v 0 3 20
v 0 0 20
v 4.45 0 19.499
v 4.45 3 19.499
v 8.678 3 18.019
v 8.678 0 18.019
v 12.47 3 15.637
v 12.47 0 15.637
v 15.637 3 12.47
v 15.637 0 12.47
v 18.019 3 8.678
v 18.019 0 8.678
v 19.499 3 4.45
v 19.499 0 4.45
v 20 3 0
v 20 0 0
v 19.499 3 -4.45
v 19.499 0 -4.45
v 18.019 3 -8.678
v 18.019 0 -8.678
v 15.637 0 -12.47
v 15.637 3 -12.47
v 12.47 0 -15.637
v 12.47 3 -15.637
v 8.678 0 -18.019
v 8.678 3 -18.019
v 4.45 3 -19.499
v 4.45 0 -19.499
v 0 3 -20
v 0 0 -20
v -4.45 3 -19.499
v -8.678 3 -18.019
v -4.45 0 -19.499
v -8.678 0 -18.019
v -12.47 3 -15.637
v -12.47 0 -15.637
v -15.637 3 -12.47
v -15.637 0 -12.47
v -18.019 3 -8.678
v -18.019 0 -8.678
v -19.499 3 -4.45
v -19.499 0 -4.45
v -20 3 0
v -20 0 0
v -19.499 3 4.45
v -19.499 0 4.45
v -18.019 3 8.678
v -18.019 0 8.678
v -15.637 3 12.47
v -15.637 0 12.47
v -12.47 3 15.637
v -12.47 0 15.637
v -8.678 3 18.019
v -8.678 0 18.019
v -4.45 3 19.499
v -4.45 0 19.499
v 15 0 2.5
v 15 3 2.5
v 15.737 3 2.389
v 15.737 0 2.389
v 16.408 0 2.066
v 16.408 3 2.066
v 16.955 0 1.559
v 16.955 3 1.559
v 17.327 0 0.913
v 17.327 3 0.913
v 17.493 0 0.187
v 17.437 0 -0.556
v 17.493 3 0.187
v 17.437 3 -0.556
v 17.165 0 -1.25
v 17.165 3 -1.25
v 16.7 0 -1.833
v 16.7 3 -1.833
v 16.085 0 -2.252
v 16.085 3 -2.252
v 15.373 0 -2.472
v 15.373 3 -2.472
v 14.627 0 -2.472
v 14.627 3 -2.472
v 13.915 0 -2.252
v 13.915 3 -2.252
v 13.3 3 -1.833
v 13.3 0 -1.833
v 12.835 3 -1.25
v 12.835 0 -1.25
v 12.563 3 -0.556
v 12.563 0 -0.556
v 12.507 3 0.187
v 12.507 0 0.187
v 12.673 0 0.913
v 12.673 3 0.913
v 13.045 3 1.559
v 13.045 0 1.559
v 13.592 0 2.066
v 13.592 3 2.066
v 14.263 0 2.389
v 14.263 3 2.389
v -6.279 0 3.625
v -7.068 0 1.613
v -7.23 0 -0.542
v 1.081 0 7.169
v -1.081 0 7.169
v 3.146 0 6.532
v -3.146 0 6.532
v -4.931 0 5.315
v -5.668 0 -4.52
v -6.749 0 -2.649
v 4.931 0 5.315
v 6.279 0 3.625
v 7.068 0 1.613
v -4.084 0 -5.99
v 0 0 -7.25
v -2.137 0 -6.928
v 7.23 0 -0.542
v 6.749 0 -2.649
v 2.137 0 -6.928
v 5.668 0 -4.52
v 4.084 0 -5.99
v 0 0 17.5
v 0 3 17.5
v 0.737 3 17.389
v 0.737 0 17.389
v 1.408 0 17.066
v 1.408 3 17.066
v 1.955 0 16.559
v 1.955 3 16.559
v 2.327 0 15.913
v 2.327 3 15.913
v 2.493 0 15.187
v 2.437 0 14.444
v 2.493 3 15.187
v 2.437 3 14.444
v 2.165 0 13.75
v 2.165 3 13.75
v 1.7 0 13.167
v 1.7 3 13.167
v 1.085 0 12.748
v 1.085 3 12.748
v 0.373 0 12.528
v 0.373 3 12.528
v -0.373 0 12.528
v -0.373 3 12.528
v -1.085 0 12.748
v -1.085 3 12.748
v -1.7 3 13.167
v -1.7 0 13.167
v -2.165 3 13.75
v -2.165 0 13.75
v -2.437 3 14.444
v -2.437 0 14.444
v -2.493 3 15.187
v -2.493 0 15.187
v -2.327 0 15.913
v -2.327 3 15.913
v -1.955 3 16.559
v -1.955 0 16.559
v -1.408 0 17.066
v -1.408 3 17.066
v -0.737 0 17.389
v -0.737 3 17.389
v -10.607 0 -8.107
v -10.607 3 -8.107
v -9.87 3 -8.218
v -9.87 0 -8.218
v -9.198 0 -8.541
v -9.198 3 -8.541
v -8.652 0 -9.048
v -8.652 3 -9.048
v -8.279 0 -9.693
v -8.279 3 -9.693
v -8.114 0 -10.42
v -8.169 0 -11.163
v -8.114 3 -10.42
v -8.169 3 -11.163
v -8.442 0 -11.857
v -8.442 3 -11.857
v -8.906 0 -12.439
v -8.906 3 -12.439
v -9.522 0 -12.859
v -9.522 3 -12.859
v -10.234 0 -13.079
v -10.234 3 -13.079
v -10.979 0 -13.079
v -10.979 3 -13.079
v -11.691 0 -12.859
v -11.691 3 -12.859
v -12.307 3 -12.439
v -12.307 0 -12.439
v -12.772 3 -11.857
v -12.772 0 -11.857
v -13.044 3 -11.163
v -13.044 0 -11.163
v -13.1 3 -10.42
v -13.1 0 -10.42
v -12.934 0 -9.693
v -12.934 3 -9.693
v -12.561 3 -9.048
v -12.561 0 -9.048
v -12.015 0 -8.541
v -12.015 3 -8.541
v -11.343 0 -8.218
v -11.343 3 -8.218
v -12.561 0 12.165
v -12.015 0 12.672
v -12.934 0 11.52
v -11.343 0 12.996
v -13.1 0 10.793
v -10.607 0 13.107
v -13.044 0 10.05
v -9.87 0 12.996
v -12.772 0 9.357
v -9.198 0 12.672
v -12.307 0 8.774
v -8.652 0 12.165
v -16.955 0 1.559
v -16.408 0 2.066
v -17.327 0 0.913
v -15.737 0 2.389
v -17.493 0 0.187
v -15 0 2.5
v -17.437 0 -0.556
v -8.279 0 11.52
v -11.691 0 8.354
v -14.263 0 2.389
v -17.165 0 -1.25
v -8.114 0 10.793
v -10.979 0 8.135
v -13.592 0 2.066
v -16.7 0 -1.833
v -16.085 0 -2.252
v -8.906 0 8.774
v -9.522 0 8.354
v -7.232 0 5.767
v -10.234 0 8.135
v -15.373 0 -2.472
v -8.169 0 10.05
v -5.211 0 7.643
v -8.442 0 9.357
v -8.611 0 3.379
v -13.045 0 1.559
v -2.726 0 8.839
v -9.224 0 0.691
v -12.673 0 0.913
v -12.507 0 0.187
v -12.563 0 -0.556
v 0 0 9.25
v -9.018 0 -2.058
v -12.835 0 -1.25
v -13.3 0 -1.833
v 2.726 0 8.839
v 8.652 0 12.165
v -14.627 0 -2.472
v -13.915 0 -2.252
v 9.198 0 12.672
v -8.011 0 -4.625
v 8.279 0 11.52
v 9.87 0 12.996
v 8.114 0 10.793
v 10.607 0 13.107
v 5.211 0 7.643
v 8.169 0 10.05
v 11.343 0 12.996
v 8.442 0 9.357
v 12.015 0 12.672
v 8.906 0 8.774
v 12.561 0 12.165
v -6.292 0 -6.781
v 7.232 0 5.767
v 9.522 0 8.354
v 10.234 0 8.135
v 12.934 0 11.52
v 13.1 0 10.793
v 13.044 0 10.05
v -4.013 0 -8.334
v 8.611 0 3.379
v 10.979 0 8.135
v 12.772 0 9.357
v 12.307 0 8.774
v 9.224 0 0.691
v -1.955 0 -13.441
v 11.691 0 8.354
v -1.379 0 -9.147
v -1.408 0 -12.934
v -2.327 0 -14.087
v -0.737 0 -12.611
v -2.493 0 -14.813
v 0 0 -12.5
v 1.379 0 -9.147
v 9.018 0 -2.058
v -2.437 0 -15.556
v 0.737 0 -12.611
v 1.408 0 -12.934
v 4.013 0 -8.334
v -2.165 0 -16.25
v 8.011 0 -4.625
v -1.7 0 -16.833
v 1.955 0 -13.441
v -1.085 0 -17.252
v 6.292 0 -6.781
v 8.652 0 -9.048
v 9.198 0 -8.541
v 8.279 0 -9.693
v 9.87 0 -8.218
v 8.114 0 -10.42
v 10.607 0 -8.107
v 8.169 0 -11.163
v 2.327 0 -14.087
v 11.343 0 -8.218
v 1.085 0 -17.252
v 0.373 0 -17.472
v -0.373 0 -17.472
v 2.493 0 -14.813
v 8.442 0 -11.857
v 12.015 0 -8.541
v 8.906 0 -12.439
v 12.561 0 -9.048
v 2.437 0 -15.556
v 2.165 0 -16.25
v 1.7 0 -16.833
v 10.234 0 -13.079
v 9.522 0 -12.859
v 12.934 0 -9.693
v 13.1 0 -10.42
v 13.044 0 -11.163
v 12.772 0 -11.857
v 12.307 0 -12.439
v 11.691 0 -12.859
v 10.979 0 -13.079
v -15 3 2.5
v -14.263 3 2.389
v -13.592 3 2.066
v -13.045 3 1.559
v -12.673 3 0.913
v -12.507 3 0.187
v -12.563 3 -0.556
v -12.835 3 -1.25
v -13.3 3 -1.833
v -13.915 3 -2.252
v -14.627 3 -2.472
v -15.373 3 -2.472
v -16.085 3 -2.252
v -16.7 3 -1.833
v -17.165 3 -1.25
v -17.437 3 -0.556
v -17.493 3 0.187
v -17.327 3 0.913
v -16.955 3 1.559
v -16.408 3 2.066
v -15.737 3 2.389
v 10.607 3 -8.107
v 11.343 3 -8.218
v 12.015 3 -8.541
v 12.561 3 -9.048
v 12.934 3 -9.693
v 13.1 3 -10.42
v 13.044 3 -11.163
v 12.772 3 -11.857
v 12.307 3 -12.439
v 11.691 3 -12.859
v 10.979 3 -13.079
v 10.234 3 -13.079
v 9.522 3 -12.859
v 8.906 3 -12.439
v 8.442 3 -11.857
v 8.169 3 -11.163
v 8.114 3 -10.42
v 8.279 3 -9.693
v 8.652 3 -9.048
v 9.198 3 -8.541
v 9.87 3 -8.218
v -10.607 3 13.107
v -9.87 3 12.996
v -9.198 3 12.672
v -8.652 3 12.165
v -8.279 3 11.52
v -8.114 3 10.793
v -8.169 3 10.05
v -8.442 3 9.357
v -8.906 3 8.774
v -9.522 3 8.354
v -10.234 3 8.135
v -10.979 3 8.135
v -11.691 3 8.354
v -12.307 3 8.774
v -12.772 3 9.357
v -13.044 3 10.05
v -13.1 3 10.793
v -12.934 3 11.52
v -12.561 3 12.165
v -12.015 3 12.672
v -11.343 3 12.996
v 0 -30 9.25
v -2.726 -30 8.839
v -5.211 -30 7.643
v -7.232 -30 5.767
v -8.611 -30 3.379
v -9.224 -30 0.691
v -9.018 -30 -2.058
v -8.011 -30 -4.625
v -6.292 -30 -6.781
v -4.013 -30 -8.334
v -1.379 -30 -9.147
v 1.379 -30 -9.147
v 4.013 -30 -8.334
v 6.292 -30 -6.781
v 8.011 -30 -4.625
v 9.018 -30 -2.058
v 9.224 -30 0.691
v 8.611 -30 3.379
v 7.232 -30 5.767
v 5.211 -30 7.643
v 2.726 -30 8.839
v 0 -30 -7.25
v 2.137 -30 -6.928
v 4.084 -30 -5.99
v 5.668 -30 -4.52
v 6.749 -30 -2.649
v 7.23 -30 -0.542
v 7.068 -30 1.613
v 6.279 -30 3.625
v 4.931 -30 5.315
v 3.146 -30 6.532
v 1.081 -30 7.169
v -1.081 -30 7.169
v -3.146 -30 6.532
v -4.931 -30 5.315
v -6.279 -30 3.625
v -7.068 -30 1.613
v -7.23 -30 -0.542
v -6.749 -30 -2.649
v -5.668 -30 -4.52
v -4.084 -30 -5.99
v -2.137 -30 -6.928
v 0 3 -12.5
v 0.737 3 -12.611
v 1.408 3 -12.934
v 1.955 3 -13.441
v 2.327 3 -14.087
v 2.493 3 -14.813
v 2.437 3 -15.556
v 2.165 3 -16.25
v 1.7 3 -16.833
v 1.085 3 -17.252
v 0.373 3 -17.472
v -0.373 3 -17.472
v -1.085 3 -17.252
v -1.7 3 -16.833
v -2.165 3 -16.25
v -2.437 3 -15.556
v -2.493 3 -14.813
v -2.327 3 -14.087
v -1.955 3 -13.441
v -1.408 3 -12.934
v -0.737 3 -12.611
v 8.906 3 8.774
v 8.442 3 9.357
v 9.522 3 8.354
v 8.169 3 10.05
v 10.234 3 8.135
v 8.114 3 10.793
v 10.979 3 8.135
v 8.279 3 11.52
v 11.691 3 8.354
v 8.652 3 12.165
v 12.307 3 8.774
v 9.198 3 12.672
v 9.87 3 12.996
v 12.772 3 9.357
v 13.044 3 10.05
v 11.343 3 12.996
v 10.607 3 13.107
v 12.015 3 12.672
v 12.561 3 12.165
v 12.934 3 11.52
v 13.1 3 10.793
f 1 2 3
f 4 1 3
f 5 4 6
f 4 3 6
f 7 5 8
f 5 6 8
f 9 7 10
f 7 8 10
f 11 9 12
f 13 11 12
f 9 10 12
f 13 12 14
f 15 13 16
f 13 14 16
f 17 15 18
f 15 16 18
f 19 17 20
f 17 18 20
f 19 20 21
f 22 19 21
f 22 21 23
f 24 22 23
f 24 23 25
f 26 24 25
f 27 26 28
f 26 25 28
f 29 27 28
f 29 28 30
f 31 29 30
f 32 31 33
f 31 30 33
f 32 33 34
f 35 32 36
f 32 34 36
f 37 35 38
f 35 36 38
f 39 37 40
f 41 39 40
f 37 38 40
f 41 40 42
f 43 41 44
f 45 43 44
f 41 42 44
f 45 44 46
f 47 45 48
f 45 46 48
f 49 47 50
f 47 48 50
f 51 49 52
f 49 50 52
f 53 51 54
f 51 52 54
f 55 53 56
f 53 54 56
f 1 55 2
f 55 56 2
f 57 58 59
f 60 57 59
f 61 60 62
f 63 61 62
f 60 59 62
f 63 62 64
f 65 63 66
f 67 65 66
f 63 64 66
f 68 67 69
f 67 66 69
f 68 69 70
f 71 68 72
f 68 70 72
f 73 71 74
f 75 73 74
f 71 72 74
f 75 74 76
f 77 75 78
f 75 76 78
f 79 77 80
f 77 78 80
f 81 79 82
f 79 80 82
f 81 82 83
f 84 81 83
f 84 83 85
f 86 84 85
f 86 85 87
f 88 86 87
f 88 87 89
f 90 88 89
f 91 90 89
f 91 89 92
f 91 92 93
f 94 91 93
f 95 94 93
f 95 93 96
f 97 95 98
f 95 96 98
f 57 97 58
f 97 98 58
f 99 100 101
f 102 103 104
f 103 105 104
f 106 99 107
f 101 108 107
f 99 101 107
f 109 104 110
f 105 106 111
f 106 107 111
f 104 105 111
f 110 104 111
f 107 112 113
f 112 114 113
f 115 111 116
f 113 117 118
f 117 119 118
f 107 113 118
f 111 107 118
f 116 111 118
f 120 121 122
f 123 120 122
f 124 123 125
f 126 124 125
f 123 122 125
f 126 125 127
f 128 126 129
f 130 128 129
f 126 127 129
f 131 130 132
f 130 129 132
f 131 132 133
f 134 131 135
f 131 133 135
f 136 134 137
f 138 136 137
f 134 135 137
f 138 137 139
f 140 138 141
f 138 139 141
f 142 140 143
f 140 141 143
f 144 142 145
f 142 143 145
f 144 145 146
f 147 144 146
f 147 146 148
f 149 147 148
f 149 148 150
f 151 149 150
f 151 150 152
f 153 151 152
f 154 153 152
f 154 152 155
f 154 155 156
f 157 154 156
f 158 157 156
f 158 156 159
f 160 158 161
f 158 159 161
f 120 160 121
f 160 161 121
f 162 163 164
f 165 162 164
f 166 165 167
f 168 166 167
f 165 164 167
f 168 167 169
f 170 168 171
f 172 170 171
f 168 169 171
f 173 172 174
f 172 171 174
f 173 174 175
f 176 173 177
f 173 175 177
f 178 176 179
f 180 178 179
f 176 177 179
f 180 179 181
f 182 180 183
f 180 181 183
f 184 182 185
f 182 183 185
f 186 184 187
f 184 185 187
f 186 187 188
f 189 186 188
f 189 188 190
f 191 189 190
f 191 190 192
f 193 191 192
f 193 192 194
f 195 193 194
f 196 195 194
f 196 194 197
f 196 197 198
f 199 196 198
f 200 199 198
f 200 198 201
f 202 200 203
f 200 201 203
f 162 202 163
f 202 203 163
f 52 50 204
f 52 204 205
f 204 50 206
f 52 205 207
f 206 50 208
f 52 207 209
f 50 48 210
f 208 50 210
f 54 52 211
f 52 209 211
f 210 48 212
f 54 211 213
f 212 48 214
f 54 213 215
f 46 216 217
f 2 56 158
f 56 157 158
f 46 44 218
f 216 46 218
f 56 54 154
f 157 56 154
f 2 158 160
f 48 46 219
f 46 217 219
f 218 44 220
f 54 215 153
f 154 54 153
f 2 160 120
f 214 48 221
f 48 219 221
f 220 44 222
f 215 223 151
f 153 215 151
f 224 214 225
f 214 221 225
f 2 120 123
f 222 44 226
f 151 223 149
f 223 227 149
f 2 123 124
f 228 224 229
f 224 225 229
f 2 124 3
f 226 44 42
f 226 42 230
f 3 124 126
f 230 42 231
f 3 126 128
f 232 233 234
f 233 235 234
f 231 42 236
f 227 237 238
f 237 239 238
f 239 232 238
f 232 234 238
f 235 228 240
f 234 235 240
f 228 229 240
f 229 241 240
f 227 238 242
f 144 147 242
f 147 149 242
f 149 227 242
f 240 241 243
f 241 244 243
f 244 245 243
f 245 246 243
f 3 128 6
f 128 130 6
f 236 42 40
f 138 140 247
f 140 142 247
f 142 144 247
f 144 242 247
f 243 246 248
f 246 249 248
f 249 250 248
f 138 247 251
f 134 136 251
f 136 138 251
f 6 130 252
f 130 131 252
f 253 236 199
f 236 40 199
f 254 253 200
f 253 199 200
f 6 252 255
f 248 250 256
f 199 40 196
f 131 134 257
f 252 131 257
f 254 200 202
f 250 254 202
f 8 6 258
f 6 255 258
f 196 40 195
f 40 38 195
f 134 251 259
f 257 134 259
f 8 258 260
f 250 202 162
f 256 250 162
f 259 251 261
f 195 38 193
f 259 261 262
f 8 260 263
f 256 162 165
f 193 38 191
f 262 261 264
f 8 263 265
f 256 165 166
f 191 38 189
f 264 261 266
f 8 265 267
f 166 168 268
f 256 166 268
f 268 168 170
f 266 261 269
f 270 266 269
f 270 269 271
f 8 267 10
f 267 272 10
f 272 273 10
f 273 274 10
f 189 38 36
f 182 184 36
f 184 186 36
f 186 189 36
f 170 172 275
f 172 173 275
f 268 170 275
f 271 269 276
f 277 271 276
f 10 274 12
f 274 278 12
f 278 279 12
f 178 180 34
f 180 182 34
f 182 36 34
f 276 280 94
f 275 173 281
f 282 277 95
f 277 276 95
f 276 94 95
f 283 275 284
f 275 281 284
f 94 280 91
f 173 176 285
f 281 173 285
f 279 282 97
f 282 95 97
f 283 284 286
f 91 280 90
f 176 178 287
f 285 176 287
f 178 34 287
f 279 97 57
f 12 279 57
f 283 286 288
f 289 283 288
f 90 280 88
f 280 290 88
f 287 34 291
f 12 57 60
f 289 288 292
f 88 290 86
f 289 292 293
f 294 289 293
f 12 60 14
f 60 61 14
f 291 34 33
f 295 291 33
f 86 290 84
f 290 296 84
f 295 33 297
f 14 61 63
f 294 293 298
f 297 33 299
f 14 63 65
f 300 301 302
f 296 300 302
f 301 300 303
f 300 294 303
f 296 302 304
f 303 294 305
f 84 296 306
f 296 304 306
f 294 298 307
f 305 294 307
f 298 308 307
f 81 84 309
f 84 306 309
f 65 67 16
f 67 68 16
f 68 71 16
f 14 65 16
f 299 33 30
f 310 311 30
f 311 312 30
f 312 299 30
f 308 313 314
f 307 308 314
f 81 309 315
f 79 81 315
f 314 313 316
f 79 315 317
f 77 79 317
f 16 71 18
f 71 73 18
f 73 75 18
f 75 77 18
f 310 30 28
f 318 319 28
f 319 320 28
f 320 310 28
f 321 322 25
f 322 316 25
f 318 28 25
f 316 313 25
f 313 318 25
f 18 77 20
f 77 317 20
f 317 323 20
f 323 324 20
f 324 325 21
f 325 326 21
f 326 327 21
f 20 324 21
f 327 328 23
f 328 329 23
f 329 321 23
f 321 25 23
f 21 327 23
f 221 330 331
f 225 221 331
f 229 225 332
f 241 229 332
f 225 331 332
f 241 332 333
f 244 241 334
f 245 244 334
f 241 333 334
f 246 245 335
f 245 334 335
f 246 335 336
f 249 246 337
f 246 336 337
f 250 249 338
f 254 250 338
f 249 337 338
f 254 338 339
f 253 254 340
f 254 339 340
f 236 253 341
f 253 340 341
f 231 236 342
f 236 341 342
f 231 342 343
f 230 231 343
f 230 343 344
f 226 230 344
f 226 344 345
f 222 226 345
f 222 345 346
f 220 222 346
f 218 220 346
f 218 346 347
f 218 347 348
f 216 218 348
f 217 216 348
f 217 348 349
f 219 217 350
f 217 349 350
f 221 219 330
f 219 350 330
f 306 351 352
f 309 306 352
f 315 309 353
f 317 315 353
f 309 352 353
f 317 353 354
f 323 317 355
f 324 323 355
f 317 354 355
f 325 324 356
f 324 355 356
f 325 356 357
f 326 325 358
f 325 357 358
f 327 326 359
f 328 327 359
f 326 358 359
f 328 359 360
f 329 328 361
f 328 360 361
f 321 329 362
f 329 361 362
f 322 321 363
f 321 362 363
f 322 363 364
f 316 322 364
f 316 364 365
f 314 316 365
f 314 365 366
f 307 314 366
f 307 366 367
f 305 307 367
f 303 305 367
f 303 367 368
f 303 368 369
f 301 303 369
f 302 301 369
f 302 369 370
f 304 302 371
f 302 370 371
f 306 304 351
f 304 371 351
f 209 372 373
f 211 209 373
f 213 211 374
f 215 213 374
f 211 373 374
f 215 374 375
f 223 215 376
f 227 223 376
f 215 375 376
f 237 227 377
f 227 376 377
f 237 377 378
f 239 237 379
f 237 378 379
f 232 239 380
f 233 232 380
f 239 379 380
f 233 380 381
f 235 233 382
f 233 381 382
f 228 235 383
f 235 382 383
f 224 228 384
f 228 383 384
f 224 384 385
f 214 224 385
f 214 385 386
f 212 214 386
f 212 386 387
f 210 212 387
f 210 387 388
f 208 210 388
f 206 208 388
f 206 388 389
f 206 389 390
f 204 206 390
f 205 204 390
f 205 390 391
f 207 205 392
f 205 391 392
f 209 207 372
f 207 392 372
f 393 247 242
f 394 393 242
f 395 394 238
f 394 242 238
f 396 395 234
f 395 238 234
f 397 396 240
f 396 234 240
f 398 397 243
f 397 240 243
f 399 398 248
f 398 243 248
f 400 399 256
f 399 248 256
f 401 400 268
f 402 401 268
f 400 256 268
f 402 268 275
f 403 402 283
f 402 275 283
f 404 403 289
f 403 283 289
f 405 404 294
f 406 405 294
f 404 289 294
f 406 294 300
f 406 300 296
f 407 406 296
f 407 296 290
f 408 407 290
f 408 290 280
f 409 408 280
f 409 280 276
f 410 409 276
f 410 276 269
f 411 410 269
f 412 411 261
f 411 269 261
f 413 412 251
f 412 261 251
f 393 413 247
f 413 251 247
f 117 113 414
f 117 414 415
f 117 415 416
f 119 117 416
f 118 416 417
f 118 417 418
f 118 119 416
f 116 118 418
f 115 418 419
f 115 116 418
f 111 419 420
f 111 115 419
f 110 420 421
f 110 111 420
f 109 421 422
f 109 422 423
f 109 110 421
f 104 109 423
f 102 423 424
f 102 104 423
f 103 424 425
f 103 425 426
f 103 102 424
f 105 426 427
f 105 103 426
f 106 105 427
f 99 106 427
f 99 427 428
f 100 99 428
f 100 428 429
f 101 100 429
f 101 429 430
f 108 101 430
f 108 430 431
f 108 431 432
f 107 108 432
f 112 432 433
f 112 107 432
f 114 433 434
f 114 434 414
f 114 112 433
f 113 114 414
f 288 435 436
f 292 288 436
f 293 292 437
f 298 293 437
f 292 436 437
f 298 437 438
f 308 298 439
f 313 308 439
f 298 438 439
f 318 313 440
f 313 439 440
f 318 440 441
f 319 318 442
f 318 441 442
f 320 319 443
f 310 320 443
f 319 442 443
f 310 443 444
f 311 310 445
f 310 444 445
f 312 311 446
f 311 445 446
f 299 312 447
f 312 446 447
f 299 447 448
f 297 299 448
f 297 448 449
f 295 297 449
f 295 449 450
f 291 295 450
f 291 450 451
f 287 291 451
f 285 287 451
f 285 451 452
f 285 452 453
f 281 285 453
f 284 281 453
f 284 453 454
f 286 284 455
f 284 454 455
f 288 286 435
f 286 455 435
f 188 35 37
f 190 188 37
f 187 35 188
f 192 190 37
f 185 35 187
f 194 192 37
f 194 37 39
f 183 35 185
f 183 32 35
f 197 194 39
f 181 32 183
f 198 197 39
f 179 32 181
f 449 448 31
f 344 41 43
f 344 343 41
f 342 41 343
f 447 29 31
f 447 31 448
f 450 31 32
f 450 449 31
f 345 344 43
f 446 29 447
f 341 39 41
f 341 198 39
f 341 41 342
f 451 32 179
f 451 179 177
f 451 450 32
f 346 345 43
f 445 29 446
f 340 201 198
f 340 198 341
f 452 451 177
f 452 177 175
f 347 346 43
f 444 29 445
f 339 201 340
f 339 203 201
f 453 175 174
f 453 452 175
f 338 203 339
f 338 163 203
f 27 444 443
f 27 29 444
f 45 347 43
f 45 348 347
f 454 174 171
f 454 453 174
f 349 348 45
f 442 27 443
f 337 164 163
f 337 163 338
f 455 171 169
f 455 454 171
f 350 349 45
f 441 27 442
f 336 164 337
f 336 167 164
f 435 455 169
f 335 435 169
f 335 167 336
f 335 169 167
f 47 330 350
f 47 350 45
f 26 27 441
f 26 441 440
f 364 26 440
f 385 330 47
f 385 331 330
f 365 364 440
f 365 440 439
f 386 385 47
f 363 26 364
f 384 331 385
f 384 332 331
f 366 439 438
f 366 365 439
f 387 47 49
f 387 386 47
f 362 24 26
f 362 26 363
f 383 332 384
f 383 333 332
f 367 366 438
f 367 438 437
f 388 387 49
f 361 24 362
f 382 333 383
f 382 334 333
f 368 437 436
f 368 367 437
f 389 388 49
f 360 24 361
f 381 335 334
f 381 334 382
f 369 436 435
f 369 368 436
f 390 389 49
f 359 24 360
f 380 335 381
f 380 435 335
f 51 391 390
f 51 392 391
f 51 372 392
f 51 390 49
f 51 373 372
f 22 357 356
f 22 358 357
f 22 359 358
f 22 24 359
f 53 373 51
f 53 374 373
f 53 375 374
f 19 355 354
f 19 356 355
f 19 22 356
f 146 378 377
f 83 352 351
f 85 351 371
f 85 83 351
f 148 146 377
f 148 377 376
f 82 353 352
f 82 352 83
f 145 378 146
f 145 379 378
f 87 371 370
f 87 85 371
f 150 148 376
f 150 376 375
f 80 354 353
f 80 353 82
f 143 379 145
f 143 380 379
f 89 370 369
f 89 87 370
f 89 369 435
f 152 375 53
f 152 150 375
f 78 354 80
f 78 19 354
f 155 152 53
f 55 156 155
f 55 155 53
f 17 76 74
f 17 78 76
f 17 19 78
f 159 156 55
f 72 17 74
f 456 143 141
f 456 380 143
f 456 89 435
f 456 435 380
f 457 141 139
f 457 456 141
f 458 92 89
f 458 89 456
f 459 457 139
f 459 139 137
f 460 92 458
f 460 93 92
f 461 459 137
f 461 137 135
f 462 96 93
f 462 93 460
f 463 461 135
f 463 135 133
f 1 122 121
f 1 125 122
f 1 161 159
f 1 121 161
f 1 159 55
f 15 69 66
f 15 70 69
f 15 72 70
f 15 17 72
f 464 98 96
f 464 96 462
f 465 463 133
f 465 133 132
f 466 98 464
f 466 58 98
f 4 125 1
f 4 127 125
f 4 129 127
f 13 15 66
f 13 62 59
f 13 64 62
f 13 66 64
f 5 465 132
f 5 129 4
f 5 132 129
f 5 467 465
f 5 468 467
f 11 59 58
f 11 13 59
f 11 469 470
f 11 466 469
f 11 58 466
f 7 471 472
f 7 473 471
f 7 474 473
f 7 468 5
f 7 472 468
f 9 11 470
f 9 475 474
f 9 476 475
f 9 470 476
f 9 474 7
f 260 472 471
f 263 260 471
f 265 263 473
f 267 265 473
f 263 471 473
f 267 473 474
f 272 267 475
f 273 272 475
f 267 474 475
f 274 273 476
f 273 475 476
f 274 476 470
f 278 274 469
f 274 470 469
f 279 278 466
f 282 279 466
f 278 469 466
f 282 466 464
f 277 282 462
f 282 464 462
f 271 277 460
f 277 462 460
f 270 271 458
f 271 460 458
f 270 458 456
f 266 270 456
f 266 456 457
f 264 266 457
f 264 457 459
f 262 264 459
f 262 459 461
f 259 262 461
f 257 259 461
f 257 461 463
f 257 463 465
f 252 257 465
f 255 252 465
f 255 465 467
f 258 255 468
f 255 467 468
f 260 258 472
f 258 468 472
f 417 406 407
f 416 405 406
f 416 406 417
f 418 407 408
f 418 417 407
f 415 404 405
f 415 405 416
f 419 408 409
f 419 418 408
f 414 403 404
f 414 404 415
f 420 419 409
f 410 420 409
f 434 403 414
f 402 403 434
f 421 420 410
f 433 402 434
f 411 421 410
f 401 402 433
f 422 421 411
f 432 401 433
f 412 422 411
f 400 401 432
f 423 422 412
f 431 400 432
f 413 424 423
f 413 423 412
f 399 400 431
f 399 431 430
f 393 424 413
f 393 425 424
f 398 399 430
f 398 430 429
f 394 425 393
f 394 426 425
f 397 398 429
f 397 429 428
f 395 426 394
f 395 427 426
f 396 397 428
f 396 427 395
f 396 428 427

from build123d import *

# Parameters (mm, degrees)
SKETCH1_R           = 20
SKETCH1_R_2         = 10
BOSS_EXTRUDE1_DEPTH = 3
SKETCH2_R           = 2.5
CUT_EXTRUDE1_DEPTH  = 3
SKETCH3_R           = 9.25
SKETCH3_R_2         = 7.25
BOSS_EXTRUDE2_DEPTH = 30


with BuildPart() as part:
    # Sketch1 → Boss-Extrude1 (new body)
    # profile 1 of 2: a face of its own
    with BuildSketch(Plane(origin=(0, 0, 0), x_dir=(1, 0, 0), z_dir=(0, 1, 0))):
        with Locations(Location((0, 0, 0), (0, 0, 270))):
            Circle(SKETCH1_R)
        Circle(SKETCH1_R_2, mode=Mode.SUBTRACT)
    # profile 2 of 2: a face of its own
    with BuildSketch(Plane(origin=(0, 0, 0), x_dir=(1, 0, 0), z_dir=(0, 1, 0))):
        Circle(SKETCH1_R_2)
    extrude(amount=BOSS_EXTRUDE1_DEPTH)

    # Sketch2 → Cut-Extrude1 (cut)
    with BuildSketch(Plane(origin=(0, 3, 0), x_dir=(1, 0, 0), z_dir=(0, 1, 0))):
        with Locations(Location((0, 15, 0), (0, 0, 270))):
            Circle(SKETCH2_R)
        with Locations(Location((10.606601718, 10.606601718, 0), (0, 0, 270))):
            Circle(SKETCH2_R)
        with Locations(Location((15, 0, 0), (0, 0, 270))):
            Circle(SKETCH2_R)
        with Locations(Location((10.606601718, -10.606601718, 0), (0, 0, 270))):
            Circle(SKETCH2_R)
        with Locations(Location((0, -15, 0), (0, 0, 270))):
            Circle(SKETCH2_R)
        with Locations(Location((-10.606601718, -10.606601718, 0), (0, 0, 270))):
            Circle(SKETCH2_R)
        with Locations(Location((-15, 0, 0), (0, 0, 270))):
            Circle(SKETCH2_R)
        with Locations(Location((-10.606601718, 10.606601718, 0), (0, 0, 270))):
            Circle(SKETCH2_R)
    extrude(amount=-CUT_EXTRUDE1_DEPTH, mode=Mode.SUBTRACT)

    # Sketch3 → Boss-Extrude2 (add)
    with BuildSketch(Plane.XZ):
        with Locations(Location((0, 0, 0), (0, 0, 90))):
            Circle(SKETCH3_R)
        with Locations(Location((0, 0, 0), (0, 0, 270))):
            Circle(SKETCH3_R_2, mode=Mode.SUBTRACT)
    extrude(amount=BOSS_EXTRUDE2_DEPTH)


solid = part.part
